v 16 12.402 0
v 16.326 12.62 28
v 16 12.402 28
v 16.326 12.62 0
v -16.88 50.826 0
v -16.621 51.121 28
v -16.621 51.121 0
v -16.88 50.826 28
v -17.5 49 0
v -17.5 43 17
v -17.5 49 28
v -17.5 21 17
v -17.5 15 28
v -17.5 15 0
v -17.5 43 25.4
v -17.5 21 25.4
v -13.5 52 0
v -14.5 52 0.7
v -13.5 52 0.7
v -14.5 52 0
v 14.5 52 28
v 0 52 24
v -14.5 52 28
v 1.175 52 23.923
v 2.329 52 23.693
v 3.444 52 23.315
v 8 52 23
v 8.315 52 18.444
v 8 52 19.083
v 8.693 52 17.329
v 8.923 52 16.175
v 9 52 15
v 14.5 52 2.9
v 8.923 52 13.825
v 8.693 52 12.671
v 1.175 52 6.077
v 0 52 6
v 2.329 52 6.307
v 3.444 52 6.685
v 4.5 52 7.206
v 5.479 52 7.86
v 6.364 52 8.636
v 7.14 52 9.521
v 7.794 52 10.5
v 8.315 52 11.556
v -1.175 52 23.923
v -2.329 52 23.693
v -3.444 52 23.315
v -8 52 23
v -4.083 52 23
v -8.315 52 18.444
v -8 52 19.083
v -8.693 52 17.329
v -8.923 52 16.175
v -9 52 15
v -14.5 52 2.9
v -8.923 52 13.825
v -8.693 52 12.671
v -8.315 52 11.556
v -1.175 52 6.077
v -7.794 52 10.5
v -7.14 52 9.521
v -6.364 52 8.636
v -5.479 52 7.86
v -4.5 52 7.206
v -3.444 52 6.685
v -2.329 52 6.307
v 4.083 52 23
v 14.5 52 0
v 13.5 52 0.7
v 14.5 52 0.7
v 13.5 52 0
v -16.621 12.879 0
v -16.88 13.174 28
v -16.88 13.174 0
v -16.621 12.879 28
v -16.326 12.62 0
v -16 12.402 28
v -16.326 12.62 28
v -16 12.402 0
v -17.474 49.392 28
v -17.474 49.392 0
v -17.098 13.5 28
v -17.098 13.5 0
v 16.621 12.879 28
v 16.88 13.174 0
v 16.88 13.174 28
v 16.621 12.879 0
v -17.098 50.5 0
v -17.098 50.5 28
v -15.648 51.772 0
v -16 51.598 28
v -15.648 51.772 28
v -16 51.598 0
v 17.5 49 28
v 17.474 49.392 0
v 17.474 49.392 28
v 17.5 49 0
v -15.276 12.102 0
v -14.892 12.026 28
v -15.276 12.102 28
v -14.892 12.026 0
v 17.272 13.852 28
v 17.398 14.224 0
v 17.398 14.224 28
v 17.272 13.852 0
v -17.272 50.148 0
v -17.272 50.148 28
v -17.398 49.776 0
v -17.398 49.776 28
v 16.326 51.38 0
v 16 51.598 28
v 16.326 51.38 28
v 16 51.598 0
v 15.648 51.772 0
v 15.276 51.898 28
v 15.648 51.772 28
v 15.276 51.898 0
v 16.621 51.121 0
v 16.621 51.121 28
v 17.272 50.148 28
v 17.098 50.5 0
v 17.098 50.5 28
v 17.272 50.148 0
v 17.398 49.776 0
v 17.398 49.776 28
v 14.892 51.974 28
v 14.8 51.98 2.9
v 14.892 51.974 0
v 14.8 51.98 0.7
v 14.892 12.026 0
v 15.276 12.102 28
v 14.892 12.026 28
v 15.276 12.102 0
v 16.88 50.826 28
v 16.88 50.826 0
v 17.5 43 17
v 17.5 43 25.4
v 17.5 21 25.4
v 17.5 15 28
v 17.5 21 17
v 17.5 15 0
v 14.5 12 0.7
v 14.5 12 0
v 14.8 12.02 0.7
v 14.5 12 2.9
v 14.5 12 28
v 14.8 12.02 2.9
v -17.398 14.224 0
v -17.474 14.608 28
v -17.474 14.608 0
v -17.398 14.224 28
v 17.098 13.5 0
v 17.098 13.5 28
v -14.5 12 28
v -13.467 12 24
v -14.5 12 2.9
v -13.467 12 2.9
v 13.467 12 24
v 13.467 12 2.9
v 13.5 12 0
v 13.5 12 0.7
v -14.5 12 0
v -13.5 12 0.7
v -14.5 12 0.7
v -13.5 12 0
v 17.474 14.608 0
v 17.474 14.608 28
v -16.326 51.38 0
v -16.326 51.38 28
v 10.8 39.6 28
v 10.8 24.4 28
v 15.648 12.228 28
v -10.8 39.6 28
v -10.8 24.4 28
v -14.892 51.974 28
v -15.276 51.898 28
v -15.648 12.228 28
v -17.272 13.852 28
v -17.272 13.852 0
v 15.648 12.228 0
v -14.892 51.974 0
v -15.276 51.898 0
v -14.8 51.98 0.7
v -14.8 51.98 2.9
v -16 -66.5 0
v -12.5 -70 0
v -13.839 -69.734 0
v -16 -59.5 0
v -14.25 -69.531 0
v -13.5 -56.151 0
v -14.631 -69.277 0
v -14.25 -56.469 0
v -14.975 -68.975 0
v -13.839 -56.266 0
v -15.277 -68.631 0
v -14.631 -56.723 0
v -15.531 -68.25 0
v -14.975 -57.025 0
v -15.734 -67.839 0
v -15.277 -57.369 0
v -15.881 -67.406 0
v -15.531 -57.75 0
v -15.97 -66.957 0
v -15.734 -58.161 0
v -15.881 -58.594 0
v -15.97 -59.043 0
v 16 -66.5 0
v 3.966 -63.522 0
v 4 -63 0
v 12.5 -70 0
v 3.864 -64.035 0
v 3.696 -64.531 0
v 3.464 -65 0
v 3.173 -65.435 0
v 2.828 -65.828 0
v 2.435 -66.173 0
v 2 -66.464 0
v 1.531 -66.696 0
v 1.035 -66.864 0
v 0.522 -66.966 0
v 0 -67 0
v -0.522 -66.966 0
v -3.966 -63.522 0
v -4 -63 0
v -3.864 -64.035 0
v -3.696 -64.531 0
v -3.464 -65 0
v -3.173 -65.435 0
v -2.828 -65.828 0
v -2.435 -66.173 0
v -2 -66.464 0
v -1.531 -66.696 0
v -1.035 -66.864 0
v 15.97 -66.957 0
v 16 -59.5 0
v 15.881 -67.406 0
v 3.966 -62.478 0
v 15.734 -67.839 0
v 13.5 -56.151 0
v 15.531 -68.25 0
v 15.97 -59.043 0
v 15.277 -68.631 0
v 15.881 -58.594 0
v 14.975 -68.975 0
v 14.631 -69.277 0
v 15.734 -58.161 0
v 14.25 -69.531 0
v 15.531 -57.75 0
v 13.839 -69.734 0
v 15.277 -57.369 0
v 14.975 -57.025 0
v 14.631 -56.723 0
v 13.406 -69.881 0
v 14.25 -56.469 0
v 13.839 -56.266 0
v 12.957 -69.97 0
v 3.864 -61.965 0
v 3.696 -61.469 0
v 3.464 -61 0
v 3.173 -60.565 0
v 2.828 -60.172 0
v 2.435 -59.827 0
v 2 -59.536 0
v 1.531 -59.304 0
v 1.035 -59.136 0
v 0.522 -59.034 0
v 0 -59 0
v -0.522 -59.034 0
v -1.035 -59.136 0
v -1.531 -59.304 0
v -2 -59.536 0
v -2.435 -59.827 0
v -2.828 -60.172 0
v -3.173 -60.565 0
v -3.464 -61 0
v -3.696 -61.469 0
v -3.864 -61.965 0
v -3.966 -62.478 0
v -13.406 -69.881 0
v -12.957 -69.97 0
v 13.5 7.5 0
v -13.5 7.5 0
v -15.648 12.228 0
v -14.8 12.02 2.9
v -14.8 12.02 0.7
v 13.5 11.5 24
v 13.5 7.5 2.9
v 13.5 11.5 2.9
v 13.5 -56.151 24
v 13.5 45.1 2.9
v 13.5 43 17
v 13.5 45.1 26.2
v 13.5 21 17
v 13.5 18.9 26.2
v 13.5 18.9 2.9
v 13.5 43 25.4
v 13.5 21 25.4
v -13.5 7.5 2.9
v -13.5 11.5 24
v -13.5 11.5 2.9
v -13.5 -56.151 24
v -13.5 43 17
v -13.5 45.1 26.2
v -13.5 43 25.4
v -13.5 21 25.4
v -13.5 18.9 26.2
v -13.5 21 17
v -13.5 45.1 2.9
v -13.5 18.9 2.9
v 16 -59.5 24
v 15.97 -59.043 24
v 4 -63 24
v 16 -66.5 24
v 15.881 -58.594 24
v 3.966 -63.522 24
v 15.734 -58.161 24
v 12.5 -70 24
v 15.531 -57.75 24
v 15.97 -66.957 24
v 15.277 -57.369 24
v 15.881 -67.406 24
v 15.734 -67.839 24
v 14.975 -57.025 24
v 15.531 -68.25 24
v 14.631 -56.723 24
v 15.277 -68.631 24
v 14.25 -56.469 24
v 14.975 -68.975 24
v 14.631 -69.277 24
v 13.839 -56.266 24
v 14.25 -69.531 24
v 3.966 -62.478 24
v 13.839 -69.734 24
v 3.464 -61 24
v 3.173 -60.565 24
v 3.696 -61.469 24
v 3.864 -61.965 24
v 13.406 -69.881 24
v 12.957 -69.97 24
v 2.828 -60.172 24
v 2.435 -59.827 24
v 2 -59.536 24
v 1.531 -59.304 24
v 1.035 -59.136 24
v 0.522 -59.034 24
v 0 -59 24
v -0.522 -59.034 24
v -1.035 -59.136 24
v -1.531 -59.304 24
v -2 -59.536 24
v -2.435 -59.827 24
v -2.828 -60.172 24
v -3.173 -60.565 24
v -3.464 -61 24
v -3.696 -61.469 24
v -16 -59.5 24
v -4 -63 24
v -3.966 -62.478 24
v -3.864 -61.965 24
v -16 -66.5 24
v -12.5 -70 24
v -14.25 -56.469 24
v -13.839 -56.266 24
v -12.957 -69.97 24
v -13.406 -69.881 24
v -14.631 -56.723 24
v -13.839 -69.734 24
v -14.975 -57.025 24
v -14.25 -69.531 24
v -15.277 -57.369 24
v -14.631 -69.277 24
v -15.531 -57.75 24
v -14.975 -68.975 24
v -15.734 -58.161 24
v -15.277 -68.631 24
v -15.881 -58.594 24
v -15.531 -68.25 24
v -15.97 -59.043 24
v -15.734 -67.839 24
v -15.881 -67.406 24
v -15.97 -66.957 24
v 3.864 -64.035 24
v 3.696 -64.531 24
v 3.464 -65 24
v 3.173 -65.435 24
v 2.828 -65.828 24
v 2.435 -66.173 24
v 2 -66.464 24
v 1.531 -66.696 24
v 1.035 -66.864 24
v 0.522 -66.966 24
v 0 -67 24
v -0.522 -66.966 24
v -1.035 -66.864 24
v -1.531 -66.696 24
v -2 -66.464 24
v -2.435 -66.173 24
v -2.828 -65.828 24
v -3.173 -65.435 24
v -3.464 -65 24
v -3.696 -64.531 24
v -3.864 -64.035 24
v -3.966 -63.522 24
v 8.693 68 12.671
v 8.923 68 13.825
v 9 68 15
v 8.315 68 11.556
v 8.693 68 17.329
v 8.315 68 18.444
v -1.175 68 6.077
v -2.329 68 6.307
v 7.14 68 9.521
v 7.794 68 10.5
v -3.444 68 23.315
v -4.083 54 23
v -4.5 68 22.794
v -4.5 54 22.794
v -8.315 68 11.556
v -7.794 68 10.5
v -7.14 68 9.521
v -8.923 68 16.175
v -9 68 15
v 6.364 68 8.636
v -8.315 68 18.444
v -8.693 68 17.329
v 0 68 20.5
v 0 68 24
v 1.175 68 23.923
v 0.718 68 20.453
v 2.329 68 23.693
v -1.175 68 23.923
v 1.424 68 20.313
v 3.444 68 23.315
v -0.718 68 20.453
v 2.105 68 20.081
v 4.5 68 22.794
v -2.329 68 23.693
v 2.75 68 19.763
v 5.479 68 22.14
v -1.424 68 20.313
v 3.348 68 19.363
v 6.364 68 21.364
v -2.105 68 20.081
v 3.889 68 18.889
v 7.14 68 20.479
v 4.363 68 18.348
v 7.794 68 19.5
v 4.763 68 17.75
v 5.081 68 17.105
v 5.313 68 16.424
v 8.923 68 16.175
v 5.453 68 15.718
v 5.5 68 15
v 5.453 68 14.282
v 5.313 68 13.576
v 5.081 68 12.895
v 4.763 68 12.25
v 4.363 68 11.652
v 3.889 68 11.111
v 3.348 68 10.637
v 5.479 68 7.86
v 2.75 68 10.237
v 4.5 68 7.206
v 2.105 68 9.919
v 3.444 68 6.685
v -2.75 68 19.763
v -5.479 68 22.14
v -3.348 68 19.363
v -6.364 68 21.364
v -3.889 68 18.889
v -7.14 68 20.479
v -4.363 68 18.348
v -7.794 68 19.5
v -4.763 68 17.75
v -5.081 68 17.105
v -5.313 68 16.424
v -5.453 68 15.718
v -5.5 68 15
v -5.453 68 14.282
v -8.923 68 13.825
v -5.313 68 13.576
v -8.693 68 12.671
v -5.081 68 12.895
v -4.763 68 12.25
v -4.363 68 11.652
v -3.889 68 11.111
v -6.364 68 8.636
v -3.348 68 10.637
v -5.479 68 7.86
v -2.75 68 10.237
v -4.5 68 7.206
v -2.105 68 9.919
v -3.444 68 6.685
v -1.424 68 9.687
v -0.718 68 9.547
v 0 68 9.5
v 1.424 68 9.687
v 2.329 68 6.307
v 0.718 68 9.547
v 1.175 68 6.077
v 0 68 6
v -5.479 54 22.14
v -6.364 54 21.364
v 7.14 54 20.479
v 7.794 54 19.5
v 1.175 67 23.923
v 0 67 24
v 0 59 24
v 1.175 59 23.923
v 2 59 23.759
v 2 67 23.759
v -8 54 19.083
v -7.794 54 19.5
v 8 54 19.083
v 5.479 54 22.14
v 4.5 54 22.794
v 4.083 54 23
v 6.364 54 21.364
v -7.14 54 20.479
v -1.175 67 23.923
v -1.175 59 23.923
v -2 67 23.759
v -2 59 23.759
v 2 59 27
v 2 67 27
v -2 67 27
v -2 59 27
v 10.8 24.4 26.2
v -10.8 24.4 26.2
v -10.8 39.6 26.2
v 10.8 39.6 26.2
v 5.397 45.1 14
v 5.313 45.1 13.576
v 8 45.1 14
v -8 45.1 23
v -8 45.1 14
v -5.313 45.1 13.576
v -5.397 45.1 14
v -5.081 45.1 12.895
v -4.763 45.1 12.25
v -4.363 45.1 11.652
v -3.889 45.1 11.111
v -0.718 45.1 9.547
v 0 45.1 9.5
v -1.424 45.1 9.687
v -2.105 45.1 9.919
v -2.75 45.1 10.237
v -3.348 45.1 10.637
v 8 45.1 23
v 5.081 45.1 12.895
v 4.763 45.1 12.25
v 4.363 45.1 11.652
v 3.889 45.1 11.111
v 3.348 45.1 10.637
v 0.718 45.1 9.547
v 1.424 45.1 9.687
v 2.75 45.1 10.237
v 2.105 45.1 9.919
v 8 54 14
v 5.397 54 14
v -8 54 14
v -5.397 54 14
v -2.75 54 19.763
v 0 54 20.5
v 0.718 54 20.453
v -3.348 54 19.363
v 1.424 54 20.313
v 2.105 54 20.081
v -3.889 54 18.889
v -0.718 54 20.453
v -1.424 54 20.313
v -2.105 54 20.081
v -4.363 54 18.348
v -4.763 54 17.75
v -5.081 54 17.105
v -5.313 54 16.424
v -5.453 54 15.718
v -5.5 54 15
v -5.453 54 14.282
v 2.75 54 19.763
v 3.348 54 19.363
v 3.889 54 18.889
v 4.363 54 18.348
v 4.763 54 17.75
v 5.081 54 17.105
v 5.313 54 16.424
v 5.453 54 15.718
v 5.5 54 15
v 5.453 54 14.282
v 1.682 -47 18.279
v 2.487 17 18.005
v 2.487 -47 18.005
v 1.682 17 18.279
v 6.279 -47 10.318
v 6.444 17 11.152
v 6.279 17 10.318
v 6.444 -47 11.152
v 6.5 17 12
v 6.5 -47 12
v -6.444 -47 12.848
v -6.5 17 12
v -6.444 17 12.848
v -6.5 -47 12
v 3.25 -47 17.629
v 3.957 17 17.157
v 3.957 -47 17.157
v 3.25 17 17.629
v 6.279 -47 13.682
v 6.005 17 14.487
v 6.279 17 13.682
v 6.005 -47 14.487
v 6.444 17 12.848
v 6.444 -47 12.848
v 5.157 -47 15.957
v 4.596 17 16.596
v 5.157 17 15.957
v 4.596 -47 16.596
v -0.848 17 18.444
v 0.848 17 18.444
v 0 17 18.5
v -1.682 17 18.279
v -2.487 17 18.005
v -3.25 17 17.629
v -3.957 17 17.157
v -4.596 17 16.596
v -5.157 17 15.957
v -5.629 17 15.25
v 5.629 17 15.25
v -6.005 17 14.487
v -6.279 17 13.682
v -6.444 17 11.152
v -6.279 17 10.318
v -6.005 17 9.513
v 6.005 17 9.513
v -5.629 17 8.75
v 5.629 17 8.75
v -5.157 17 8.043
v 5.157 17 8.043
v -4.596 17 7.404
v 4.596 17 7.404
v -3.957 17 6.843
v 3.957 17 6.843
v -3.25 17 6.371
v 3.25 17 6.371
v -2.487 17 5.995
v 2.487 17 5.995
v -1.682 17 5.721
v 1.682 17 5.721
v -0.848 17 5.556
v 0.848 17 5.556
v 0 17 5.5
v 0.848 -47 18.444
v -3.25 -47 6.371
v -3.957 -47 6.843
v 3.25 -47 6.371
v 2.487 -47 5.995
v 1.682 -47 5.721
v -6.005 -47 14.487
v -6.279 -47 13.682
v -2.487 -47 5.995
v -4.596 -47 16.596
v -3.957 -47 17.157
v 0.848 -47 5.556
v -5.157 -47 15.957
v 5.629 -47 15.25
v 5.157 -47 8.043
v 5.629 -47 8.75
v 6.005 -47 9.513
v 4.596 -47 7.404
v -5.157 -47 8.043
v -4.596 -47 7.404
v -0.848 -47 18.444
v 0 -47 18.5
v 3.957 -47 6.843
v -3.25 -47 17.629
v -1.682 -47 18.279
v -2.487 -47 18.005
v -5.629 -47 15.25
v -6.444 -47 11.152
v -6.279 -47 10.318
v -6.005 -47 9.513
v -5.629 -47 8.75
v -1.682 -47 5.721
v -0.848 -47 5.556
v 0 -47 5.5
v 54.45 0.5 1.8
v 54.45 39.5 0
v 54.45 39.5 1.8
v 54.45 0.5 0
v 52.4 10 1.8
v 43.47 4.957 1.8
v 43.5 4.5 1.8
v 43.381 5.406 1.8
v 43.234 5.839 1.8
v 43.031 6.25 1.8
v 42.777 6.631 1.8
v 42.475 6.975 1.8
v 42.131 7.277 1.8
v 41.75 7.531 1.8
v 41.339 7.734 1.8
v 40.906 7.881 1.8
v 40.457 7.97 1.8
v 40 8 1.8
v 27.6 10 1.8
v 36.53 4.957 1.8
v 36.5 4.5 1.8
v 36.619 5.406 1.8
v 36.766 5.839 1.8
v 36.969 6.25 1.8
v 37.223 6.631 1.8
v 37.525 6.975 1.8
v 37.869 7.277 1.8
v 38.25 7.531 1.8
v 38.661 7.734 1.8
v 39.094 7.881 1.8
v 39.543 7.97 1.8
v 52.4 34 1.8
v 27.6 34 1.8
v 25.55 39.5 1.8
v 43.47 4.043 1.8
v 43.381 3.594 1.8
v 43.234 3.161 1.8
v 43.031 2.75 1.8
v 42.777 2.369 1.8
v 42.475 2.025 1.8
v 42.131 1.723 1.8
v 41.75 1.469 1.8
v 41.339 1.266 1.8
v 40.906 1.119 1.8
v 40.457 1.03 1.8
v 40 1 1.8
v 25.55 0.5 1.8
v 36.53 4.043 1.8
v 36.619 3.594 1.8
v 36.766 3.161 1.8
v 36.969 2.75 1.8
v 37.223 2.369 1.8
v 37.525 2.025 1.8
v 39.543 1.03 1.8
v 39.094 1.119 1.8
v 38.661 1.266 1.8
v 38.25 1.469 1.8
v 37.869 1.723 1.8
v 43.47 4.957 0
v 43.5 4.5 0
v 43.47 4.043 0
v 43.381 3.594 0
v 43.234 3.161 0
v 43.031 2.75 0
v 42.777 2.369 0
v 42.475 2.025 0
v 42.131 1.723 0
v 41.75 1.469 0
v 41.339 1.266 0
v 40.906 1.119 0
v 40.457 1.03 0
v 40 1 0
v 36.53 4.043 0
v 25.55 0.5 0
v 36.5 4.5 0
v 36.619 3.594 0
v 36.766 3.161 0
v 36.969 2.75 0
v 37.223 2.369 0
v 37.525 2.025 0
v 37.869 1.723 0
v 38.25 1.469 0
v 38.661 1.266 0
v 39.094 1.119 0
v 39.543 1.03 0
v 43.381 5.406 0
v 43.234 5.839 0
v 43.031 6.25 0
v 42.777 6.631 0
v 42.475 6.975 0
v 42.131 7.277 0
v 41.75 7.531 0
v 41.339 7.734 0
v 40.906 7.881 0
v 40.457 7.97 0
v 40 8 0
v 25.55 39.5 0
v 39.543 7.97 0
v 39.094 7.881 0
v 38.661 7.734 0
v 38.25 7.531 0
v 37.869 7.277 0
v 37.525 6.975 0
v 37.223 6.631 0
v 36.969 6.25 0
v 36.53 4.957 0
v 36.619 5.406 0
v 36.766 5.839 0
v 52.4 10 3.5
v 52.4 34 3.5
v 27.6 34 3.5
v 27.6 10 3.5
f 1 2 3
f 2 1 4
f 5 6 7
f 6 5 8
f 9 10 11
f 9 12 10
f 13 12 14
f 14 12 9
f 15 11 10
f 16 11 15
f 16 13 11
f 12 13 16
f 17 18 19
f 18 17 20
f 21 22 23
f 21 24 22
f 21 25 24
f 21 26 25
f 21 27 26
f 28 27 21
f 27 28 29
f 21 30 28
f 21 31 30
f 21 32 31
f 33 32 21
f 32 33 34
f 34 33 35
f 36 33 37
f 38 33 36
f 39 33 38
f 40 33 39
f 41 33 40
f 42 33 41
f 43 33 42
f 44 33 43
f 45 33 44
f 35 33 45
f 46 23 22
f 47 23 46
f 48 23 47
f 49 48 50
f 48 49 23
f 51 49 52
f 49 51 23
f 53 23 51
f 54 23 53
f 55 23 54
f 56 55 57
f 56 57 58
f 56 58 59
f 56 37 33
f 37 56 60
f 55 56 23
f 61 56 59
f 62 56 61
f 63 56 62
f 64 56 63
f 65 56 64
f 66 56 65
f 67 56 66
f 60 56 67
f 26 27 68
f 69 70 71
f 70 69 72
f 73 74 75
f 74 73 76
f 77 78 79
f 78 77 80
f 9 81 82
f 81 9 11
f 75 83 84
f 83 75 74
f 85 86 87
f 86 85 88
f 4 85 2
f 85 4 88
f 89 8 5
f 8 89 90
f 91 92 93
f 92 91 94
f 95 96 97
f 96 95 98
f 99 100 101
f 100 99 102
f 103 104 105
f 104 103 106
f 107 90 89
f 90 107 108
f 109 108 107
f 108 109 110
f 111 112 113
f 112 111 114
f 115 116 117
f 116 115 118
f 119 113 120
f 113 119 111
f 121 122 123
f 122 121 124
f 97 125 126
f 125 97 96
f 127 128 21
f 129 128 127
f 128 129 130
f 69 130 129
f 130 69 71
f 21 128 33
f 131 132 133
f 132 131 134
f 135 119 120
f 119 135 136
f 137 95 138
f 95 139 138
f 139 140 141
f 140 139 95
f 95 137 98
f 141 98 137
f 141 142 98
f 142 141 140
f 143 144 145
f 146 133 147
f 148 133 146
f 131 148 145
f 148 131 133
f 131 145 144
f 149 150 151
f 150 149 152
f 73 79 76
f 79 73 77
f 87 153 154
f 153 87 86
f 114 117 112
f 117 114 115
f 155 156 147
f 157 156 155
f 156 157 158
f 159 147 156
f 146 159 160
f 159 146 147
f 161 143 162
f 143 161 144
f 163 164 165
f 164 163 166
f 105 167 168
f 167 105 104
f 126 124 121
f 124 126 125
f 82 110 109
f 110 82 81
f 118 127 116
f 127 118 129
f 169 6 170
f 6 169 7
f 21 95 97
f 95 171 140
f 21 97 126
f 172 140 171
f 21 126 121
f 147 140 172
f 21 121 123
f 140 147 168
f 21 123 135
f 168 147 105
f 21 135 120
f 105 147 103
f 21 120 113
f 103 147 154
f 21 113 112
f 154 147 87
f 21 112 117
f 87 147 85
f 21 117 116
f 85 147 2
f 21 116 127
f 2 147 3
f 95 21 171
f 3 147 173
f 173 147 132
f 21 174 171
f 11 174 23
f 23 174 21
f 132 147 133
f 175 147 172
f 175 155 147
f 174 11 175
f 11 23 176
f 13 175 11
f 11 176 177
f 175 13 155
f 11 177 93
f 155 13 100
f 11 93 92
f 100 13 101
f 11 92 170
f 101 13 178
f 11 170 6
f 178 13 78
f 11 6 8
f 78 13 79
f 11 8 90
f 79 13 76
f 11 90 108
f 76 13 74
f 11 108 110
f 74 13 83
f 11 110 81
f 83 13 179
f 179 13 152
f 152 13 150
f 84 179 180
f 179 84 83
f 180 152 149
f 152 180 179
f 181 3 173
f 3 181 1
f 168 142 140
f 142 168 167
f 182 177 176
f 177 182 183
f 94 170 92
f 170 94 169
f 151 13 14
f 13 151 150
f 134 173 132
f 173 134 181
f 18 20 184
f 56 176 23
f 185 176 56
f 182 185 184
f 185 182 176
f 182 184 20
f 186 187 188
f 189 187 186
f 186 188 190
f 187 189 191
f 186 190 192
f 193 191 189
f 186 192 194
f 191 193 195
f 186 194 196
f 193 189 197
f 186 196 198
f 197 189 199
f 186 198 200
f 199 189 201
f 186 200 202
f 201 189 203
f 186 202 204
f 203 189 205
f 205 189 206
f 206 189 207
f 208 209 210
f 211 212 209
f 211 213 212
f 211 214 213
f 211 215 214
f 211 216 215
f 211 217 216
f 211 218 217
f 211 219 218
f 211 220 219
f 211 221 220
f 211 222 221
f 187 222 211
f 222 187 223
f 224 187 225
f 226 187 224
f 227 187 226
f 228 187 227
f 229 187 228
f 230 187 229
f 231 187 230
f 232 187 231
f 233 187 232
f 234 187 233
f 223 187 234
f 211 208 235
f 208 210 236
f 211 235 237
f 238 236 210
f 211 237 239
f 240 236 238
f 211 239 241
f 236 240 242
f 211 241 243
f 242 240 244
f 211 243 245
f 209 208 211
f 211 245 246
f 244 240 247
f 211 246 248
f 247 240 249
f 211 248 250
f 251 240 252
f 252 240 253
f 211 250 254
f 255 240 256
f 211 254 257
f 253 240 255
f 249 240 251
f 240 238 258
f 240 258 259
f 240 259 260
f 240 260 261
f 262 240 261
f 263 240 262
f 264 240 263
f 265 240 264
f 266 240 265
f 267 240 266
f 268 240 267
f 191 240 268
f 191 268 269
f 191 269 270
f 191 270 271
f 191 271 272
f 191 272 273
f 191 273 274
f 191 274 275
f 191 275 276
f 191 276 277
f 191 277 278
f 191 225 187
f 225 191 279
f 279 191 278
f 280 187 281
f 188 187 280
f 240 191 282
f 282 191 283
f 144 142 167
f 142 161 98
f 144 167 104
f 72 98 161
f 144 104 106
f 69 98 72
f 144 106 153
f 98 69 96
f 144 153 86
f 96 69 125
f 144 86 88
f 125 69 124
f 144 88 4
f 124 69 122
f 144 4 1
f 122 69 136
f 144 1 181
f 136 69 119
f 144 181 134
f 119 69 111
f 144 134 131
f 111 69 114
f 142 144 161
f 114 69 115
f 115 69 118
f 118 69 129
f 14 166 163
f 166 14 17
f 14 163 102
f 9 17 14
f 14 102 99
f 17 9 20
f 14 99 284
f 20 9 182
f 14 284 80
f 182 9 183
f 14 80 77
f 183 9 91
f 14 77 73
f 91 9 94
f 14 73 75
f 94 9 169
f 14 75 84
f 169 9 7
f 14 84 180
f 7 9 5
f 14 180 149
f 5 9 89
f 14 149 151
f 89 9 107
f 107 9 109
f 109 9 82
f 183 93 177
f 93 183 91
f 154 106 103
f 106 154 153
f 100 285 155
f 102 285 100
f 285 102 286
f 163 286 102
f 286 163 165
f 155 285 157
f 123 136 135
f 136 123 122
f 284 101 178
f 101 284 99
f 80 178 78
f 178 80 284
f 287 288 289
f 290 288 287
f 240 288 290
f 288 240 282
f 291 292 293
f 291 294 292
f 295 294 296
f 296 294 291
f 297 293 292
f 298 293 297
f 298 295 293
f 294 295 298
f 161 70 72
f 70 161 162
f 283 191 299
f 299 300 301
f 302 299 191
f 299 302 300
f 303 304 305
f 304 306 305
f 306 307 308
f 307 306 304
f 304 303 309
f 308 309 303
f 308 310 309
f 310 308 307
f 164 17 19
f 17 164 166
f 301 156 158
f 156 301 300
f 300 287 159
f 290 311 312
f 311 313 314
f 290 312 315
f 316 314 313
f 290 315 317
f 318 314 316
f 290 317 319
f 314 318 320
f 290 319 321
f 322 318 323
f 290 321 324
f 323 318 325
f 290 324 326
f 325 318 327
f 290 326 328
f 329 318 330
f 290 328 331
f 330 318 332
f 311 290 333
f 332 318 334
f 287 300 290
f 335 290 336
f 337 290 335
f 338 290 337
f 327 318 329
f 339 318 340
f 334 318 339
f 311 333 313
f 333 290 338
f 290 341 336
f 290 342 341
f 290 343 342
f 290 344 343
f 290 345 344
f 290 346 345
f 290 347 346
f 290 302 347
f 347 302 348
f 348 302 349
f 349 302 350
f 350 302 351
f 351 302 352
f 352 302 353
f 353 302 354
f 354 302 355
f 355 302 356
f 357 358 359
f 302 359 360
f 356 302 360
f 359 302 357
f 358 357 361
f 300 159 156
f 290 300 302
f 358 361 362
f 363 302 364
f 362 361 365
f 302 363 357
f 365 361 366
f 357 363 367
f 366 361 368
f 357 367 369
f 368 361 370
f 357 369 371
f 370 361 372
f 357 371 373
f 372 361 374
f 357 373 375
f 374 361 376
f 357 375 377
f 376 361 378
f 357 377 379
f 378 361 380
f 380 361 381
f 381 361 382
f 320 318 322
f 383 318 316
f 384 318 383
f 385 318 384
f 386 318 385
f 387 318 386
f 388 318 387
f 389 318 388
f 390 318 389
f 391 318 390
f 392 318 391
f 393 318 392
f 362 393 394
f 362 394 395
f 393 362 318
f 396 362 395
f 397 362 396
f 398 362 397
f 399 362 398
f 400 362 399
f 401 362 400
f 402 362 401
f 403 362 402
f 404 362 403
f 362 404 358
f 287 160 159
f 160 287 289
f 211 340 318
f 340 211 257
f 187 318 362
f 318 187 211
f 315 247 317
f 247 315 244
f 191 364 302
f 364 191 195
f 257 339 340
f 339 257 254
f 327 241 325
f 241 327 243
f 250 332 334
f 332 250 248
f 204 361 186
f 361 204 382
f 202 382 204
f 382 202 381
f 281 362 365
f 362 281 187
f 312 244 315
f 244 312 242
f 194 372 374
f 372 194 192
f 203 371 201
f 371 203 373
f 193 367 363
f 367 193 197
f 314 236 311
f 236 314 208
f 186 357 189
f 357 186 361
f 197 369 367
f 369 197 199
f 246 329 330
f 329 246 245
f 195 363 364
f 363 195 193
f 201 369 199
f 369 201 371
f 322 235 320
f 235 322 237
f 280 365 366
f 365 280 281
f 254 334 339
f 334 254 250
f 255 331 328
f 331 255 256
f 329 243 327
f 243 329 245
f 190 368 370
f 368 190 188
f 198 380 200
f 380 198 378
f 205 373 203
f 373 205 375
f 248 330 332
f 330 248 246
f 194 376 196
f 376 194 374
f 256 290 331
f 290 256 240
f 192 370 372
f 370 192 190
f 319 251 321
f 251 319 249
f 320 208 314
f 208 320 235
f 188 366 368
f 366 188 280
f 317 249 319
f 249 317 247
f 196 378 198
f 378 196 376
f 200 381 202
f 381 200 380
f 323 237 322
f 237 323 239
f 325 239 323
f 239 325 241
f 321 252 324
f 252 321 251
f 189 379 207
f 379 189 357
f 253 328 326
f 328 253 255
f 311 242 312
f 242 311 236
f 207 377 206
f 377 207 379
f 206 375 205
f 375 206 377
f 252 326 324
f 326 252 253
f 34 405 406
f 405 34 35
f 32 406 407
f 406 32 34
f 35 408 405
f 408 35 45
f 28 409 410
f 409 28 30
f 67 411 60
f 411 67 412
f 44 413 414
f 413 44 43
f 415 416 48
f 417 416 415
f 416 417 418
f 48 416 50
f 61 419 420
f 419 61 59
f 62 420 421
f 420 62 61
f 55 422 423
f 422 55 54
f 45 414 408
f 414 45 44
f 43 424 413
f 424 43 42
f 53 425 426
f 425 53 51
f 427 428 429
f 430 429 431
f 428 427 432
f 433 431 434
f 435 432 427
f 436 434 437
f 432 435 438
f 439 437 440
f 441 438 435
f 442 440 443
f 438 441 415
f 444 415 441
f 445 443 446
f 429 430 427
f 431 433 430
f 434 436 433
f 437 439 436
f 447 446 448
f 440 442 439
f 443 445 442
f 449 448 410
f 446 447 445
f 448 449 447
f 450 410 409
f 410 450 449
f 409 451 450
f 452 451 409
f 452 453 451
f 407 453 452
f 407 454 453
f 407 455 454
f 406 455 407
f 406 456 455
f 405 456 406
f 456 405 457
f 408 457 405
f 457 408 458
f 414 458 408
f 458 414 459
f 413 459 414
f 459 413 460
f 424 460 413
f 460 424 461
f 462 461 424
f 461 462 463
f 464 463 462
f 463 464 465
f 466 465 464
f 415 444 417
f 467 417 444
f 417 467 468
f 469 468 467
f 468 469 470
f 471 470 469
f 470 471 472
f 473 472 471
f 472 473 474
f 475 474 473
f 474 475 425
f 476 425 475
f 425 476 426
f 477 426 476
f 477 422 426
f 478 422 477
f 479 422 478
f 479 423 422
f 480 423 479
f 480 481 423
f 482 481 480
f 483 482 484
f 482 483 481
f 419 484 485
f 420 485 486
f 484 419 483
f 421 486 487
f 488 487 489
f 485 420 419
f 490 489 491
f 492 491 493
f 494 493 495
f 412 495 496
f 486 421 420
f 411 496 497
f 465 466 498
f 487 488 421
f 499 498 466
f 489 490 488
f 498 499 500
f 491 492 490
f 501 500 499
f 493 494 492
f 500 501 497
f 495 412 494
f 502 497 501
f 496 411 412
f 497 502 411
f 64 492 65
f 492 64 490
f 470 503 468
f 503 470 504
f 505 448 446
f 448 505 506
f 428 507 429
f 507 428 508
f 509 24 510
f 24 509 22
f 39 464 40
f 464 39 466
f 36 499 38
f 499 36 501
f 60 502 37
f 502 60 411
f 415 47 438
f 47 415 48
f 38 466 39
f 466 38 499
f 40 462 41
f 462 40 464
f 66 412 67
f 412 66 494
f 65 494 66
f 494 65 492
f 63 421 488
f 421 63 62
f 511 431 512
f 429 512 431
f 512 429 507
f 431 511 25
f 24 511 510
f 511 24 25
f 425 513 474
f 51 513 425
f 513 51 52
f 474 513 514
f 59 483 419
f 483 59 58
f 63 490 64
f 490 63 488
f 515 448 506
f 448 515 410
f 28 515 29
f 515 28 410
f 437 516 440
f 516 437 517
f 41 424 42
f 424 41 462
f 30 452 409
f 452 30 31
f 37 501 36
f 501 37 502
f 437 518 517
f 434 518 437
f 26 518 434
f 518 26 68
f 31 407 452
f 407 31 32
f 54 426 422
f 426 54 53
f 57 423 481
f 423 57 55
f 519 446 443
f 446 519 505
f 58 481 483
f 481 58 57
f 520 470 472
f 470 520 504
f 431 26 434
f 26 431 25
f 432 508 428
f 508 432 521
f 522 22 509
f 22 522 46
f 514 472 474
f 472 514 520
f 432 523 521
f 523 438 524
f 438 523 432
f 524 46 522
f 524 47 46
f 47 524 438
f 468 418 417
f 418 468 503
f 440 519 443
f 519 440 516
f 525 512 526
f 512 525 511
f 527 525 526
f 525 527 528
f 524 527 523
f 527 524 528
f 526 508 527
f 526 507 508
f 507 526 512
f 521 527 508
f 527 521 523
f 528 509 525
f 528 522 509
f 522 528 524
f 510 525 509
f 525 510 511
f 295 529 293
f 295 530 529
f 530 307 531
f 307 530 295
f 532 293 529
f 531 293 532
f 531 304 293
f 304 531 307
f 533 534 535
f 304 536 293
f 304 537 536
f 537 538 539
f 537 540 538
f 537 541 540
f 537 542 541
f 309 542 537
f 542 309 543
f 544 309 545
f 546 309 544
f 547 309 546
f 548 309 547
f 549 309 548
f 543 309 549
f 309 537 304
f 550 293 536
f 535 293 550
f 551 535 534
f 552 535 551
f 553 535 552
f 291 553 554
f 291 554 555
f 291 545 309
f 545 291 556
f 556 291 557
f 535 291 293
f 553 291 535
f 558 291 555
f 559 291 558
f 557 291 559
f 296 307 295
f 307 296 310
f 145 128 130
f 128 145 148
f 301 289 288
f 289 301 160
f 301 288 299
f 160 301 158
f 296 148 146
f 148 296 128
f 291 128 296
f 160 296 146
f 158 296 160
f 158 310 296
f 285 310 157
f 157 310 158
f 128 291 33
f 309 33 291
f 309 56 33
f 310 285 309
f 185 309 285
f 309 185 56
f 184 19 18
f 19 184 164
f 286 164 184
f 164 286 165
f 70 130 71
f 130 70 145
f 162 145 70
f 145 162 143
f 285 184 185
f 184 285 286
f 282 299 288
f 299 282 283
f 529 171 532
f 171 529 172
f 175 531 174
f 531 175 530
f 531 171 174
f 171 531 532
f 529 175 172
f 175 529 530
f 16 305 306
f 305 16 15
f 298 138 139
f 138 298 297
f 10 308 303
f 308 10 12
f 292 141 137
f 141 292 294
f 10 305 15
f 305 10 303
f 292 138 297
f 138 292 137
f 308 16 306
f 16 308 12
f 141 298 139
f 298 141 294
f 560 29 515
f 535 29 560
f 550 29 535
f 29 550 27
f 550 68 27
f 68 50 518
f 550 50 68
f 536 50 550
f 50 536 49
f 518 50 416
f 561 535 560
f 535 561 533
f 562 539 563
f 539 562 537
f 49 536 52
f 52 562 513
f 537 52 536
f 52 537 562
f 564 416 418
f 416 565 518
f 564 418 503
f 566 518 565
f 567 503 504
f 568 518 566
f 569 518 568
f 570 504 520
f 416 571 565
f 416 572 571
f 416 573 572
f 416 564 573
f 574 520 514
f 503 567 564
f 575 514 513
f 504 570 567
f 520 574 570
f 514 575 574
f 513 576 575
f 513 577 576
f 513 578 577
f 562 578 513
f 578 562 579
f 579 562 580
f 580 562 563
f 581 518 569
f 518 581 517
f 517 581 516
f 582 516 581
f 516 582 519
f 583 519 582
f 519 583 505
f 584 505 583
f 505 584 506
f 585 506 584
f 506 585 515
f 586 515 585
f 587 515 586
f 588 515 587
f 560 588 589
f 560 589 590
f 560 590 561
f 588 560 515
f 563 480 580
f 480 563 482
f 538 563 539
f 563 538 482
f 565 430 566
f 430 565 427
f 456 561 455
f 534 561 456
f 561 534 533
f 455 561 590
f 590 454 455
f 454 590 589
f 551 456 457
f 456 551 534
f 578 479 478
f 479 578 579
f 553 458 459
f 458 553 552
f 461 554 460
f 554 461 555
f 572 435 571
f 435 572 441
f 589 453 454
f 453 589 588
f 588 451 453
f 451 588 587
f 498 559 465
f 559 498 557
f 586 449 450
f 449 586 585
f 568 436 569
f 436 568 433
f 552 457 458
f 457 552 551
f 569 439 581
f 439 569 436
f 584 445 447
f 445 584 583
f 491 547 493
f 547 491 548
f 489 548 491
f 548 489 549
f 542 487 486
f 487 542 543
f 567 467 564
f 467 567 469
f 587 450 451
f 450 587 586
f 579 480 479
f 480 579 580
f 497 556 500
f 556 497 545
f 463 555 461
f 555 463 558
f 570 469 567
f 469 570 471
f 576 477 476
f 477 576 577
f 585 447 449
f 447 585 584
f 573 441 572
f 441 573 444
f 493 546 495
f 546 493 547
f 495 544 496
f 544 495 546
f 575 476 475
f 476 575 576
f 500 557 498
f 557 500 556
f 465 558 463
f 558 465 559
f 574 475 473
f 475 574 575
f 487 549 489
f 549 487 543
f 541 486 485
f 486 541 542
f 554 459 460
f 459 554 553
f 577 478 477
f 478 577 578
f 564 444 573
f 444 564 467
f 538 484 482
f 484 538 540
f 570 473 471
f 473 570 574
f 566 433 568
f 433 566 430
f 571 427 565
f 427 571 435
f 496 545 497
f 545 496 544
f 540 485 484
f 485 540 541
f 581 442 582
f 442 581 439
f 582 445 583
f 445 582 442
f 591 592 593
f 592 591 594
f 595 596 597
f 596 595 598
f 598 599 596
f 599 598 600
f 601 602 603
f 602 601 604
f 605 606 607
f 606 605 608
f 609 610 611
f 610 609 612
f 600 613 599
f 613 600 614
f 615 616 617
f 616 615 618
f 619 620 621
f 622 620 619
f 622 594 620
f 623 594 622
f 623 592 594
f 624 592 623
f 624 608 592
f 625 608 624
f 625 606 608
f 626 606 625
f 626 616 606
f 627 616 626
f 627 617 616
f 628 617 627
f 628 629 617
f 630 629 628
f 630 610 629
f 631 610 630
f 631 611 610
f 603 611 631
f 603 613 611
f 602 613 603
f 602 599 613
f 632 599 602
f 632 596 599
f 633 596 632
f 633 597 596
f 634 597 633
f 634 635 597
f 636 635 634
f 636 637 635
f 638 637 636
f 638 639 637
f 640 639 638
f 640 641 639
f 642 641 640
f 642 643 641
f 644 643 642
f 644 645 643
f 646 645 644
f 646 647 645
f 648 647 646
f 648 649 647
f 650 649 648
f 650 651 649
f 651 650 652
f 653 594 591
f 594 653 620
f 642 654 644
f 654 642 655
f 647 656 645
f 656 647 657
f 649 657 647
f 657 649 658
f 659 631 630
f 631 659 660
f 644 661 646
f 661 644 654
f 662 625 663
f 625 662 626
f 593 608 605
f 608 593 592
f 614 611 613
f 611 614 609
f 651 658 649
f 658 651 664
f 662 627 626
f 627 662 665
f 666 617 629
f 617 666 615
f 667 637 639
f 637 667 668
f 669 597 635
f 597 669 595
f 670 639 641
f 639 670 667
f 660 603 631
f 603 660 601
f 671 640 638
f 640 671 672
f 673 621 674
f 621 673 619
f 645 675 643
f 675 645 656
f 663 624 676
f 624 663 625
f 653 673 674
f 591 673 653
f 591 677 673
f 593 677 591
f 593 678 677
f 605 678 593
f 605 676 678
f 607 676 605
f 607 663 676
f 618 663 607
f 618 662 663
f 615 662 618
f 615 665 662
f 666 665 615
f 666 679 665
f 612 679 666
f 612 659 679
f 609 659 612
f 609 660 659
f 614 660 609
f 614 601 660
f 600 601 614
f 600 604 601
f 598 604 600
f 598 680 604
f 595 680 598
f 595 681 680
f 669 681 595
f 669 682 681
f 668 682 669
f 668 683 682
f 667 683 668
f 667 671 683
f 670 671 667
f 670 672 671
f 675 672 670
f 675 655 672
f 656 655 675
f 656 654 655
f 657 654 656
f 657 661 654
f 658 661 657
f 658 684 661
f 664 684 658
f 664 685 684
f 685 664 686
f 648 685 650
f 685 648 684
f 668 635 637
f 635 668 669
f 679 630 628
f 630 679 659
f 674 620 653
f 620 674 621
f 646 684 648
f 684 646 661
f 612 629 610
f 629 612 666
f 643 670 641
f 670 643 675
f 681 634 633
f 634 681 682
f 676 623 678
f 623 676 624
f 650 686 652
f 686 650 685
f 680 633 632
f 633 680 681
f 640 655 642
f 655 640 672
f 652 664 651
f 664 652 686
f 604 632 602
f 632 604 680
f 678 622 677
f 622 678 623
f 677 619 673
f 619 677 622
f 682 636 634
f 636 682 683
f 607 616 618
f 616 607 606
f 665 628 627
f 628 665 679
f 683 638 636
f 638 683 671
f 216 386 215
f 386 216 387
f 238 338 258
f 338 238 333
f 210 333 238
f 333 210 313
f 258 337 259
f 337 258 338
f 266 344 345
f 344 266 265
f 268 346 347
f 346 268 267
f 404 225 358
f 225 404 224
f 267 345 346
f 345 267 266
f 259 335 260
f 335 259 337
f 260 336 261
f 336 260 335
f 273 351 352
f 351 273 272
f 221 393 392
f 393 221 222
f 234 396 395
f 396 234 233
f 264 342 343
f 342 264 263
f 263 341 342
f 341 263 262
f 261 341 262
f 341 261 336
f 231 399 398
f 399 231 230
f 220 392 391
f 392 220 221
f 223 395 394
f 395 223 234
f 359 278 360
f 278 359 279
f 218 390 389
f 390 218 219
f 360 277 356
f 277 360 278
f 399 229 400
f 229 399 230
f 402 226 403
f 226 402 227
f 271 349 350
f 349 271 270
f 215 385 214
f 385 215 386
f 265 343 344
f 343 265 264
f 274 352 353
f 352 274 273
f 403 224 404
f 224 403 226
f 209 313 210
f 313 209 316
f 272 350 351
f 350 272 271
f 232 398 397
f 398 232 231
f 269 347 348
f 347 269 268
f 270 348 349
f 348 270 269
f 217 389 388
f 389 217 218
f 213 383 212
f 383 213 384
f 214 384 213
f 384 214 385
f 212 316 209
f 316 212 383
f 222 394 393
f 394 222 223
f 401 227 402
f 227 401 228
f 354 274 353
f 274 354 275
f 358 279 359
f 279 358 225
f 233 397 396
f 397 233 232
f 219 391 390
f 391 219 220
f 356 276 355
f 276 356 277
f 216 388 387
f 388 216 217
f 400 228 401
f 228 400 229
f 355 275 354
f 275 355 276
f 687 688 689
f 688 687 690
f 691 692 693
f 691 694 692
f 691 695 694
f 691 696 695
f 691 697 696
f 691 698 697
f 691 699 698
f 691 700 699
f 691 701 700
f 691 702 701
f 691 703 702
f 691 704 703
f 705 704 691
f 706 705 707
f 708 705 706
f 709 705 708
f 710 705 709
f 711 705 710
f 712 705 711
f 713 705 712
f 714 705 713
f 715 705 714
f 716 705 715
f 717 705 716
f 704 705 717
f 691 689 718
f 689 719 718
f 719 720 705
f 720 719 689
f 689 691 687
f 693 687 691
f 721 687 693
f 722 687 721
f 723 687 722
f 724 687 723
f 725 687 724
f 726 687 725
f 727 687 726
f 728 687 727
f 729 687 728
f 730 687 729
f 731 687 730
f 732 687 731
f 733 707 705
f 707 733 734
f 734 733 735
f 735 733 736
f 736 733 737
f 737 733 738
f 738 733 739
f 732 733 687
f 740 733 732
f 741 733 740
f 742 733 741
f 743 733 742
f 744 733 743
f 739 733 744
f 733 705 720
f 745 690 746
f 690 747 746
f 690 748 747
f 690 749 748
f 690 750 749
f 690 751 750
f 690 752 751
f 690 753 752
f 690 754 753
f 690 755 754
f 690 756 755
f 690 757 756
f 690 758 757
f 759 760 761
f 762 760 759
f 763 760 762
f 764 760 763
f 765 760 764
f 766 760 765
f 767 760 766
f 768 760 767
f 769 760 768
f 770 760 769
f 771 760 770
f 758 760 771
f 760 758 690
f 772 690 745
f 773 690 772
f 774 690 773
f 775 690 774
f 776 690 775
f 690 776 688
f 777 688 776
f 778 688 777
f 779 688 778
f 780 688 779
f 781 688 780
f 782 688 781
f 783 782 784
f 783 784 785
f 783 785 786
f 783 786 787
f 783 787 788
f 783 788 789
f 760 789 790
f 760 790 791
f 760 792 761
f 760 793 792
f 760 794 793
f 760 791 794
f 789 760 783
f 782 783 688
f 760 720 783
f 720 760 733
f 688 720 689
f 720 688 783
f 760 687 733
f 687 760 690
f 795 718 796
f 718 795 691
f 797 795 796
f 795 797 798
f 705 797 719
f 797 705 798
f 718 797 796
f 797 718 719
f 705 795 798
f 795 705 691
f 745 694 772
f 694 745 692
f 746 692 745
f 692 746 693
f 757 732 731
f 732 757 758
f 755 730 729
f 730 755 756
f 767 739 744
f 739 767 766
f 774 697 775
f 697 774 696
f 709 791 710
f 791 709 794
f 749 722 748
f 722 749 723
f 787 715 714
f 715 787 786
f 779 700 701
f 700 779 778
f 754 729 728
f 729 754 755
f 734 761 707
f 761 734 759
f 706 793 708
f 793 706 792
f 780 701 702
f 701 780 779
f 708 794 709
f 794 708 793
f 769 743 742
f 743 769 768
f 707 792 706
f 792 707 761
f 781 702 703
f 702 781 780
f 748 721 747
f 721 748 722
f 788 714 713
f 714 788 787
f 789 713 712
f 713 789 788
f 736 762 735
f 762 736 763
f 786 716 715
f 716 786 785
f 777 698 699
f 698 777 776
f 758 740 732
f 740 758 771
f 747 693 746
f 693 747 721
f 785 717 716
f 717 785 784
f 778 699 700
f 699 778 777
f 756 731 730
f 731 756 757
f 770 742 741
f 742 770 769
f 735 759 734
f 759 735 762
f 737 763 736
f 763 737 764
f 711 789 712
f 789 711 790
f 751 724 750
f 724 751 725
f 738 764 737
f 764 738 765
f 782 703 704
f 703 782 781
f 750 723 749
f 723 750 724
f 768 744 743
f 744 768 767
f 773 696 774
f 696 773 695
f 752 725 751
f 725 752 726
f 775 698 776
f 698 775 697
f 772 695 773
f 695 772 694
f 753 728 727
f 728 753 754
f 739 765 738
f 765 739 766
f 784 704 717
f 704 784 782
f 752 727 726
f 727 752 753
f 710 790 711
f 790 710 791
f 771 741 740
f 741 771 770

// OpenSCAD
// ============================================================================
// Beat-Draw Showdown: Parametric "Drumstick Revolver" 3D Print Model (OpenSCAD)
// Units: millimeters (mm)
// Fits: TinyScreen+ (ASM2022) + ST BLE (ASD2116-R) + Accel (ASD2511-R-A)
//       + 150mAh LiPo Battery (+ optional Wireling Adapter ASD2022)
// ============================================================================

$fn = 48;

// --- Editable Tolerances (tweak if your printer runs tight) ---
pcb_width_x       = 27.0;  // 25.8mm TinyScreen+ PCB + 1.2mm total clearance
pcb_length_y      = 26.2;  // 25.0mm TinyScreen+ PCB + 1.2mm total clearance
cavity_depth_z    = 22.7;  // Fits 3-to-4 board stack + 150mAh LiPo battery
oled_win_x        = 21.6;  // Visible 96x64 OLED active area window width
oled_win_y        = 15.2;  // Visible 96x64 OLED active area window height
top_bezel_z       = 1.8;   // Lip thickness holding TinyScreen+ top face

module rounded_box(sx, sy, sz, r) {
    hull() {
        for (dx = [-sx/2 + r, sx/2 - r])
            for (dy = [-sy/2 + r, sy/2 - r])
                translate([dx, dy, 0])
                    cylinder(r=r, h=sz, center=false);
    }
}

module revolver_body() {
    difference() {
        union() {
            // 1. Scope Head Housing (Y = +12 to +52 mm)
            translate([0, 32, 0])
                rounded_box(35.0, 40.0, 28.0, 3.0);
            
            // 2. Ergonomic Drumstick Grip (Y = -65 to +16 mm)
            translate([0, -24.5, 0])
                rounded_box(27.0, 81.0, 24.0, 4.5);
            
            // 3. Flared Revolver Pommel (Y = -70 to -56 mm)
            translate([0, -63.0, 0])
                rounded_box(32.0, 14.0, 24.0, 3.5);
            
            // 4. Revolver Barrel Nose & Front Sight (Y = +50 to +68 mm)
            translate([0, 50.0, 15.0])
                rotate([-90, 0, 0])
                    cylinder(r=9.0, h=18.0);
            translate([-2.0, 59.0, 22.0])
                cube([4.0, 8.0, 5.0]);
        }

        // A. TinyScreen+ Stack & Battery Cavity (loads from bottom)
        translate([-pcb_width_x/2, 32 - pcb_length_y/2, 0.0])
            cube([pcb_width_x, pcb_length_y, 28.0 - top_bezel_z]);

        // B. Slide-On Lid Grooves near bottom (Z = 0.7 to 2.9 mm)
        translate([-14.8, 7.5, 0.7])
            cube([29.6, 45.0, 2.2]);
        translate([-13.5, 7.5, -0.1])
            cube([27.0, 45.0, 1.5]);

        // C. Top OLED Scope Window
        translate([-oled_win_x/2, 32 - oled_win_y/2, 25.0])
            cube([oled_win_x, oled_win_y, 6.0]);

        // D. Left & Right Button + Power Switch Cutouts
        translate([-20.0, 21.0, 17.0])
            cube([40.0, 22.0, 8.4]);

        // E. Micro-USB Programming / Charging Access + Barrel Bore
        translate([-8.0, 42.0, 14.0])
            cube([16.0, 12.0, 9.0]);
        translate([0, 44.0, 15.0])
            rotate([-90, 0, 0])
                cylinder(r=5.5, h=28.0);

        // F. Handle Weight-Reduction Core & Lanyard Hole
        translate([0, -47.0, 12.0])
            rotate([-90, 0, 0])
                cylinder(r=6.5, h=64.0);
        translate([0, -63.0, -1.0])
            cylinder(r=4.0, h=30.0);
    }
}

module slide_lid() {
    difference() {
        union() {
            translate([-14.45, -19.5, 0])
                cube([28.9, 39.0, 1.8]);
            translate([-12.4, -10.0, 1.8])
                cube([24.8, 24.0, 1.7]);
        }
        translate([0, -15.5, -1.0])
            cylinder(r=3.5, h=6.0);
    }
}

// Render Body and Lid side-by-side for printing
revolver_body();
translate([40, 20, 0]) slide_lid();
